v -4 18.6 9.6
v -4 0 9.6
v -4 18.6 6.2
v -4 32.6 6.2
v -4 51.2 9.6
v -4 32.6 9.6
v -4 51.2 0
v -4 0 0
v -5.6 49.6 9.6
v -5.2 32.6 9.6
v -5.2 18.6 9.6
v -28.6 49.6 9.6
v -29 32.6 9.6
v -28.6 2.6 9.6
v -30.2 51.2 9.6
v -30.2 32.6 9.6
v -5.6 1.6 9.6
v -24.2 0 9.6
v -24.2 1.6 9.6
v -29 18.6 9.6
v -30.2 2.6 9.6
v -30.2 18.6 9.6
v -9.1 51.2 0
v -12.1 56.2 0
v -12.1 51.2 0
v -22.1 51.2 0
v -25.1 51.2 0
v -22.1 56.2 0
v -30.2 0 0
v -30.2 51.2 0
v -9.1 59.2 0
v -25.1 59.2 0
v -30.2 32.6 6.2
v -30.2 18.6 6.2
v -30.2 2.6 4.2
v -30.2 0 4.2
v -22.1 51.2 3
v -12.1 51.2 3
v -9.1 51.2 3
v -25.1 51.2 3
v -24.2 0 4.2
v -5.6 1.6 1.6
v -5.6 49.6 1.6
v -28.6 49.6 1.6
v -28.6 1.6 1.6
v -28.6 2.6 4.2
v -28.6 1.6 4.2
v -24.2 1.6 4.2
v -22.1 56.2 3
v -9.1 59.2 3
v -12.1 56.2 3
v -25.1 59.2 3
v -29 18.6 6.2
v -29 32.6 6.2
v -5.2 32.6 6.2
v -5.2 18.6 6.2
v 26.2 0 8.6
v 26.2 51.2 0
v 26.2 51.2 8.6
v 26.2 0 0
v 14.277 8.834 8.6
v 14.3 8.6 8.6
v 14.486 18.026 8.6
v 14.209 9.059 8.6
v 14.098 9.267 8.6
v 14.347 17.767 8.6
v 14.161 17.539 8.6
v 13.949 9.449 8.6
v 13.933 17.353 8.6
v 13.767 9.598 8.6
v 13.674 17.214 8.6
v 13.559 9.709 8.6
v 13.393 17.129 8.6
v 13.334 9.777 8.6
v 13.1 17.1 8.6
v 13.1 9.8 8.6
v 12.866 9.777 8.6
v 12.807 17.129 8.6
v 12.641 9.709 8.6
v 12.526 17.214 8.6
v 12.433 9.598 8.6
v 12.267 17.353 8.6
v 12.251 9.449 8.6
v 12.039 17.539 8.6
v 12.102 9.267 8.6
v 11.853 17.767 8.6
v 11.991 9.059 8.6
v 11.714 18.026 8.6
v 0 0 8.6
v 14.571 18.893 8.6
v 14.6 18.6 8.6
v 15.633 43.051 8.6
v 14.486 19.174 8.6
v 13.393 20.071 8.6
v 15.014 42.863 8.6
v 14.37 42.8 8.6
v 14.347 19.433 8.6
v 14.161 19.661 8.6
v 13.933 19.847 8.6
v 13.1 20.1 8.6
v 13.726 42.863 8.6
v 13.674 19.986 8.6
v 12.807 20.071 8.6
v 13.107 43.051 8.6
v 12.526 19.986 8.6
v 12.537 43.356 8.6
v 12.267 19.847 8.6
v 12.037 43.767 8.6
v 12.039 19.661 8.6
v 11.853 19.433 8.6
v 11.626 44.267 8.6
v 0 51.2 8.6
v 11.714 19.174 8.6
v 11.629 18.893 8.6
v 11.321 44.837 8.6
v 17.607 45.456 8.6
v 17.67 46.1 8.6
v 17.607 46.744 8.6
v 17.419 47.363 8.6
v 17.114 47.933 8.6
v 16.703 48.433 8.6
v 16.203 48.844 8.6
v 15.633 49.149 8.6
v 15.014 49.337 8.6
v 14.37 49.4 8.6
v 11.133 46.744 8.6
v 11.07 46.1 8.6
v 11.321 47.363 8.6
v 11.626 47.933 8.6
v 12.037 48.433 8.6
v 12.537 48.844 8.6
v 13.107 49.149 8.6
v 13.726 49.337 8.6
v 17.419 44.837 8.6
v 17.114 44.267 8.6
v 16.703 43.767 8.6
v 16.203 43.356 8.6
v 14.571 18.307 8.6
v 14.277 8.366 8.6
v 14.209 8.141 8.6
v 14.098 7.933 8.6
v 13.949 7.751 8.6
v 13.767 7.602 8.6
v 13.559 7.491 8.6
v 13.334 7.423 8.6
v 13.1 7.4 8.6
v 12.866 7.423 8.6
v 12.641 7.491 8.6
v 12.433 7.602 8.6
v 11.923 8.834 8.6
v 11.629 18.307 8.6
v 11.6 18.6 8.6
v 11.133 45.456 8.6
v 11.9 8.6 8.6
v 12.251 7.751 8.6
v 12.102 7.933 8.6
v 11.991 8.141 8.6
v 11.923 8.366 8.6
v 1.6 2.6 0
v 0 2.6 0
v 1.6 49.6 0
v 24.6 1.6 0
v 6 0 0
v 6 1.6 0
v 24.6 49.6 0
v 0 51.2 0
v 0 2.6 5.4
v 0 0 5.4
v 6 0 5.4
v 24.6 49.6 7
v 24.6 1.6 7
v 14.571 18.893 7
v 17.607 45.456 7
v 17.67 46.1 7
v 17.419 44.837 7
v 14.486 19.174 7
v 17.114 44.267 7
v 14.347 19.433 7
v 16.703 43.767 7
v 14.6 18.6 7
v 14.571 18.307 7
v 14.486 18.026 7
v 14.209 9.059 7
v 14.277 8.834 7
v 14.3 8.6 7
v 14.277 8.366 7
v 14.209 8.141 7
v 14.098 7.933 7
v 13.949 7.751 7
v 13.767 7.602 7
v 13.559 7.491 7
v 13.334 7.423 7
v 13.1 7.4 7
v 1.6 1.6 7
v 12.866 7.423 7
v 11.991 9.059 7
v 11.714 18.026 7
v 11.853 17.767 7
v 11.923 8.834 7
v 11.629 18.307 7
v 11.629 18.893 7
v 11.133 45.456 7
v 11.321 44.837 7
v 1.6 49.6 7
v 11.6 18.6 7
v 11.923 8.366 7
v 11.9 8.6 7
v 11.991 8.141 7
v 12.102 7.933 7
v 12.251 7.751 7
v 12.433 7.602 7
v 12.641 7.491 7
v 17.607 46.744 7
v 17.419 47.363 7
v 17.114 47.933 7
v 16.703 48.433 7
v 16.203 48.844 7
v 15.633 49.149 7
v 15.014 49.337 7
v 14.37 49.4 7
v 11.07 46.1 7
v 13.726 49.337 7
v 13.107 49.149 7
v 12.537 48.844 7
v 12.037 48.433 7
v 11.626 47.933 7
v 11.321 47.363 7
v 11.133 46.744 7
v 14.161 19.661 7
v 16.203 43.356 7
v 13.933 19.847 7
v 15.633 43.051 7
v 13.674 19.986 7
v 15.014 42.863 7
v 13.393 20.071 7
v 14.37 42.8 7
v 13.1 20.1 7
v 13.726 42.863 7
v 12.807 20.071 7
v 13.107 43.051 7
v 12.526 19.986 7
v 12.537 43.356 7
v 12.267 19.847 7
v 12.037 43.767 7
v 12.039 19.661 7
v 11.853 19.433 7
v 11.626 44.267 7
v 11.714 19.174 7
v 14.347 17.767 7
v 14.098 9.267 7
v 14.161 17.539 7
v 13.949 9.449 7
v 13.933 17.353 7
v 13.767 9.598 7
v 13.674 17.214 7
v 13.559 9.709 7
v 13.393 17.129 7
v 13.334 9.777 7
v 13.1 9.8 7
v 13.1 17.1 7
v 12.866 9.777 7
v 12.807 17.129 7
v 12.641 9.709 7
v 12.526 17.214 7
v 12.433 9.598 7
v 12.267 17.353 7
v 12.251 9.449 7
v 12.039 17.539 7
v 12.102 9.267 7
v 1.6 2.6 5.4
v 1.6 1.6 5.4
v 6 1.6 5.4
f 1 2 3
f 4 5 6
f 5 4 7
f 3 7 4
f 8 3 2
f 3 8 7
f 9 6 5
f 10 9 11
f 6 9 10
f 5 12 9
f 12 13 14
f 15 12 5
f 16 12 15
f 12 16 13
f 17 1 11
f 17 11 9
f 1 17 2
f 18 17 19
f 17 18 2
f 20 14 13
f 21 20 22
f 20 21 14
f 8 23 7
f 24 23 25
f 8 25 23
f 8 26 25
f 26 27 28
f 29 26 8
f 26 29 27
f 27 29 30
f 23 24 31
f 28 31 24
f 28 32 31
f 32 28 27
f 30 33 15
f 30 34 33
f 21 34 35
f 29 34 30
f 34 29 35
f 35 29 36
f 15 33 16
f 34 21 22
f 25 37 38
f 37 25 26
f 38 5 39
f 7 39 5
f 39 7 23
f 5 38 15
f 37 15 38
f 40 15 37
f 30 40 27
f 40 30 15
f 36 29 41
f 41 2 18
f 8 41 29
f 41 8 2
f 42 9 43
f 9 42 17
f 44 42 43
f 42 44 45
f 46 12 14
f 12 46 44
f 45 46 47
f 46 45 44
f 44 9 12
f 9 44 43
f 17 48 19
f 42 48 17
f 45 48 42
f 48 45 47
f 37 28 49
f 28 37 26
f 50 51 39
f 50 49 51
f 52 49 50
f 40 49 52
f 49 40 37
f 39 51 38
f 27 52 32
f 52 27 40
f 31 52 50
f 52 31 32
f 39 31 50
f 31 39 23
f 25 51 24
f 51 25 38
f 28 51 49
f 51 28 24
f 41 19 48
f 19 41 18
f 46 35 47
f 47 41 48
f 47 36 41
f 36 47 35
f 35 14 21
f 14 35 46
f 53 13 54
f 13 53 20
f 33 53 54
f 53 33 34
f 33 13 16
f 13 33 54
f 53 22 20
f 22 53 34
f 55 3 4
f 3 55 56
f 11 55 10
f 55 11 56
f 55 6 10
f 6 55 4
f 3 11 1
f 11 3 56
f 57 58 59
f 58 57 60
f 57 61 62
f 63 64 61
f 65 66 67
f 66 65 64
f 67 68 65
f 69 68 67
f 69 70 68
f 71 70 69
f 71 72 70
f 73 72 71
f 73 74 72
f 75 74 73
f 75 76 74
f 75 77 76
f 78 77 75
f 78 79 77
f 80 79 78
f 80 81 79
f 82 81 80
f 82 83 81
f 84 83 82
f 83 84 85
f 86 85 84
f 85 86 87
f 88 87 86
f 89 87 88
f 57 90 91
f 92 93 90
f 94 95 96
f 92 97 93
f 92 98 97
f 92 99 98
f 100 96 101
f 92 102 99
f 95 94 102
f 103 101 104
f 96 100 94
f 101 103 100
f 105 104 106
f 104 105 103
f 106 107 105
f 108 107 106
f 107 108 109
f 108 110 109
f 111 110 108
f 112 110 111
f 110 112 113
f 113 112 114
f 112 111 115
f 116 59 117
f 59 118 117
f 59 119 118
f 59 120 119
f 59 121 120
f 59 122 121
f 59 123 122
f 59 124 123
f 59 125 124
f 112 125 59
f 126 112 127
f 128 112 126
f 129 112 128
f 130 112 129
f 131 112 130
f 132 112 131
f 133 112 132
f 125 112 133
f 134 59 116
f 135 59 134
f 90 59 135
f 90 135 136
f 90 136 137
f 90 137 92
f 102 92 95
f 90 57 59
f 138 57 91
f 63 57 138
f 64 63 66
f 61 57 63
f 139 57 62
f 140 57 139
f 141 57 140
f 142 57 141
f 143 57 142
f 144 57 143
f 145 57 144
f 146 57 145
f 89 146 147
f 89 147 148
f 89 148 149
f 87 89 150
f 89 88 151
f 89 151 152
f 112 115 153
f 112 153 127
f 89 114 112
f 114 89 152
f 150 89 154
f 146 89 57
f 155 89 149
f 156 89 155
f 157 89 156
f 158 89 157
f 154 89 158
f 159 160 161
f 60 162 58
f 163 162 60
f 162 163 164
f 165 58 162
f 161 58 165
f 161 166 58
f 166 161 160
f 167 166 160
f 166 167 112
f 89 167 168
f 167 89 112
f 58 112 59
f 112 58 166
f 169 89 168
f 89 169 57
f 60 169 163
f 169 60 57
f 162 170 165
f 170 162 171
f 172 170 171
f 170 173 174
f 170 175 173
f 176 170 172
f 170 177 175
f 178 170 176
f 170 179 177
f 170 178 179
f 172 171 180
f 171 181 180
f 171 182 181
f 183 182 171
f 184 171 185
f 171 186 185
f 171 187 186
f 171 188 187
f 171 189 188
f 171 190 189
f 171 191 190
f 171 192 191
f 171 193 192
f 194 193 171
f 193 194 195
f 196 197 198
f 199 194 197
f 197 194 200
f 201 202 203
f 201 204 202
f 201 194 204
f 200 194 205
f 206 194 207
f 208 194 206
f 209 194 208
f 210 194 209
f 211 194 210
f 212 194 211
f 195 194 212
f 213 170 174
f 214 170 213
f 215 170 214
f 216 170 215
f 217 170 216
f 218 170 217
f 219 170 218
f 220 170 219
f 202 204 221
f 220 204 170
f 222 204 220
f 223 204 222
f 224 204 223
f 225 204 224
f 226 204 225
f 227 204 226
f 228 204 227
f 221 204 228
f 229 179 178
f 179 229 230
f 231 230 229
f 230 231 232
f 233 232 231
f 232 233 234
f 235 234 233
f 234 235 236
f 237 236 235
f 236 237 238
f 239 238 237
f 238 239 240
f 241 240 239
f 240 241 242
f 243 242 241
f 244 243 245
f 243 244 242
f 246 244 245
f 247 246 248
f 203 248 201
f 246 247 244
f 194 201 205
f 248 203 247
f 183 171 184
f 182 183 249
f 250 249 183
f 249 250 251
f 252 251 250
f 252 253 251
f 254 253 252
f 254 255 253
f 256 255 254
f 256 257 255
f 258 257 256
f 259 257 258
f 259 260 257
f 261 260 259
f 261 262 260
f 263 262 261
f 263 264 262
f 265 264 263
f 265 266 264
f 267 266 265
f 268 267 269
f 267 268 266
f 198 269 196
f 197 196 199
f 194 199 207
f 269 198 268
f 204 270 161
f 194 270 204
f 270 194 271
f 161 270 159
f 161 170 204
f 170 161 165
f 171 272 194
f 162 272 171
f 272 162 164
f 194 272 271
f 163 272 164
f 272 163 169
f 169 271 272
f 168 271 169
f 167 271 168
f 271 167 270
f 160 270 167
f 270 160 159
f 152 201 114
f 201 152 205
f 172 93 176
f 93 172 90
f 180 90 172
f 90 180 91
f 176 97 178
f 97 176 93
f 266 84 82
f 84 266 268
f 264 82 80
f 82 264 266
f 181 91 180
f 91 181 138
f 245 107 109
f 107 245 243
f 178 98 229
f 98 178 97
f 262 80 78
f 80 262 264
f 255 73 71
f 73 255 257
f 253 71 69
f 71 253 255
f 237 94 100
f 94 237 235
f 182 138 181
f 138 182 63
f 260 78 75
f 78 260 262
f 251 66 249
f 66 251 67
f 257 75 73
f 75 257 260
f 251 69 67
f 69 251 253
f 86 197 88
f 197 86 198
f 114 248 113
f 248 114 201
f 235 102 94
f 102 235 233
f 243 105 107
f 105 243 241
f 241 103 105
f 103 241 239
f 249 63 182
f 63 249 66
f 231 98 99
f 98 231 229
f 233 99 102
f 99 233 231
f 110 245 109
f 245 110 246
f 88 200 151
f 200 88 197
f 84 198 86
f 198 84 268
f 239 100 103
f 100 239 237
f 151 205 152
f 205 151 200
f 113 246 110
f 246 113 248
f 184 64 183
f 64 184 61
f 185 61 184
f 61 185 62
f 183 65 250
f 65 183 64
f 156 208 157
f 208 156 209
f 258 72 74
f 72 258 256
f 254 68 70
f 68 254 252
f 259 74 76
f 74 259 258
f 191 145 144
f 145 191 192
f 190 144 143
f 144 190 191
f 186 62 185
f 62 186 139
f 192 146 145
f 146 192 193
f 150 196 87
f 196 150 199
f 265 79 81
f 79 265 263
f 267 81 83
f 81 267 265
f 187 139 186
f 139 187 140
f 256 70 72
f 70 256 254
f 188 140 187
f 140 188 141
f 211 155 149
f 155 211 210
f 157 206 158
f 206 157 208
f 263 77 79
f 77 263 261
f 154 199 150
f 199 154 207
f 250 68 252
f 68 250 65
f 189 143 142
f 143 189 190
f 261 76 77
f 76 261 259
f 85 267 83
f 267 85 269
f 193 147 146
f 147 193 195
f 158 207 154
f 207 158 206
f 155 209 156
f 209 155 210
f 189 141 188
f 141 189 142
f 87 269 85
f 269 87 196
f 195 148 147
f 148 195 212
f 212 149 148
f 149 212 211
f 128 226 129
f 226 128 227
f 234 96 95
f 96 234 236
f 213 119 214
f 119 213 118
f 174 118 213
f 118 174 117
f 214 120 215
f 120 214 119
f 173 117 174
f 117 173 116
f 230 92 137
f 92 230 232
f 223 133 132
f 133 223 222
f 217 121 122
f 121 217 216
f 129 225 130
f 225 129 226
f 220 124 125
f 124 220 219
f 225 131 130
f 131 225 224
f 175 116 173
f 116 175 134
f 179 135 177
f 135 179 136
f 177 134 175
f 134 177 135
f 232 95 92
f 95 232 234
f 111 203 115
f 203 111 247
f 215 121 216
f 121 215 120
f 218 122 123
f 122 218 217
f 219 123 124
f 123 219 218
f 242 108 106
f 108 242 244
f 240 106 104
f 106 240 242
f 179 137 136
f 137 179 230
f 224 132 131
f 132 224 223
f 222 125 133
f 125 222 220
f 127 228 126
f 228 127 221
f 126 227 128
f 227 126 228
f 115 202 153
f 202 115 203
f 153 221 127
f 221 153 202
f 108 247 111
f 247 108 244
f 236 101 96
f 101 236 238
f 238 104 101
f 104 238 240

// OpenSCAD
// OpenPendant clamshell — PETG, 0.2 mm layers, 3 walls.
// USB-C window on the bottom seam. No SD slot: open the lid to reach the card.
// Units: millimetres.

inner_w = 23;
inner_h = 48;
inner_d_back = 8.0;
inner_d_front = 7.0;
wall = 1.6;
usb_w = 12.0;
usb_h = 5.4;
mic_y = 17;
mic_r = 1.5;
led_y = 7;
led_r = 1.2;
btn_y = 44.5;
btn_r = 3.3;
bail_h = 8;
bail_t = 3;
$fn = 32;

outer_w = inner_w + 2 * wall;
outer_h = inner_h + 2 * wall;

module usb_cut(z, h) {
  translate([-usb_w / 2, -1, z]) cube([usb_w, wall + 2, h]);
}

module back() {
  difference() {
    union() {
      difference() {
        cube([outer_w, outer_h, inner_d_back + wall], center = false);
        translate([wall, wall, wall])
          cube([inner_w, inner_h, inner_d_back + 1]);
      }
      // cord bail
      translate([outer_w / 2 - 8, outer_h, 0]) cube([3, bail_h, bail_t]);
      translate([outer_w / 2 + 5, outer_h, 0]) cube([3, bail_h, bail_t]);
      translate([outer_w / 2 - 8, outer_h + bail_h - bail_t, 0])
        cube([16, bail_t, bail_t]);
    }
    usb_cut(inner_d_back + wall - usb_h, usb_h + 1);
    // fingernail grooves
    translate([-0.1, outer_h / 2 - 7, inner_d_back + wall - 3.4])
      cube([1.3, 14, 3.6]);
    translate([outer_w - 1.2, outer_h / 2 - 7, inner_d_back + wall - 3.4])
      cube([1.3, 14, 3.6]);
  }
}

module front() {
  difference() {
    cube([outer_w, outer_h, inner_d_front + wall], center = false);
    translate([wall, wall, -1]) cube([inner_w, inner_h, inner_d_front + 1]);
    usb_cut(-1, usb_h + 1);
    translate([outer_w / 2, wall + mic_y, inner_d_front])
      cylinder(h = wall + 2, r = mic_r);
    translate([outer_w / 2, wall + led_y, inner_d_front])
      cylinder(h = wall + 2, r = led_r);
    translate([outer_w / 2 + 1.27, wall + btn_y, inner_d_front])
      cylinder(h = wall + 2, r = btn_r);
  }
}

// Preview both; export each module separately for print.
translate([-outer_w - 4, 0, 0]) back();
front();
